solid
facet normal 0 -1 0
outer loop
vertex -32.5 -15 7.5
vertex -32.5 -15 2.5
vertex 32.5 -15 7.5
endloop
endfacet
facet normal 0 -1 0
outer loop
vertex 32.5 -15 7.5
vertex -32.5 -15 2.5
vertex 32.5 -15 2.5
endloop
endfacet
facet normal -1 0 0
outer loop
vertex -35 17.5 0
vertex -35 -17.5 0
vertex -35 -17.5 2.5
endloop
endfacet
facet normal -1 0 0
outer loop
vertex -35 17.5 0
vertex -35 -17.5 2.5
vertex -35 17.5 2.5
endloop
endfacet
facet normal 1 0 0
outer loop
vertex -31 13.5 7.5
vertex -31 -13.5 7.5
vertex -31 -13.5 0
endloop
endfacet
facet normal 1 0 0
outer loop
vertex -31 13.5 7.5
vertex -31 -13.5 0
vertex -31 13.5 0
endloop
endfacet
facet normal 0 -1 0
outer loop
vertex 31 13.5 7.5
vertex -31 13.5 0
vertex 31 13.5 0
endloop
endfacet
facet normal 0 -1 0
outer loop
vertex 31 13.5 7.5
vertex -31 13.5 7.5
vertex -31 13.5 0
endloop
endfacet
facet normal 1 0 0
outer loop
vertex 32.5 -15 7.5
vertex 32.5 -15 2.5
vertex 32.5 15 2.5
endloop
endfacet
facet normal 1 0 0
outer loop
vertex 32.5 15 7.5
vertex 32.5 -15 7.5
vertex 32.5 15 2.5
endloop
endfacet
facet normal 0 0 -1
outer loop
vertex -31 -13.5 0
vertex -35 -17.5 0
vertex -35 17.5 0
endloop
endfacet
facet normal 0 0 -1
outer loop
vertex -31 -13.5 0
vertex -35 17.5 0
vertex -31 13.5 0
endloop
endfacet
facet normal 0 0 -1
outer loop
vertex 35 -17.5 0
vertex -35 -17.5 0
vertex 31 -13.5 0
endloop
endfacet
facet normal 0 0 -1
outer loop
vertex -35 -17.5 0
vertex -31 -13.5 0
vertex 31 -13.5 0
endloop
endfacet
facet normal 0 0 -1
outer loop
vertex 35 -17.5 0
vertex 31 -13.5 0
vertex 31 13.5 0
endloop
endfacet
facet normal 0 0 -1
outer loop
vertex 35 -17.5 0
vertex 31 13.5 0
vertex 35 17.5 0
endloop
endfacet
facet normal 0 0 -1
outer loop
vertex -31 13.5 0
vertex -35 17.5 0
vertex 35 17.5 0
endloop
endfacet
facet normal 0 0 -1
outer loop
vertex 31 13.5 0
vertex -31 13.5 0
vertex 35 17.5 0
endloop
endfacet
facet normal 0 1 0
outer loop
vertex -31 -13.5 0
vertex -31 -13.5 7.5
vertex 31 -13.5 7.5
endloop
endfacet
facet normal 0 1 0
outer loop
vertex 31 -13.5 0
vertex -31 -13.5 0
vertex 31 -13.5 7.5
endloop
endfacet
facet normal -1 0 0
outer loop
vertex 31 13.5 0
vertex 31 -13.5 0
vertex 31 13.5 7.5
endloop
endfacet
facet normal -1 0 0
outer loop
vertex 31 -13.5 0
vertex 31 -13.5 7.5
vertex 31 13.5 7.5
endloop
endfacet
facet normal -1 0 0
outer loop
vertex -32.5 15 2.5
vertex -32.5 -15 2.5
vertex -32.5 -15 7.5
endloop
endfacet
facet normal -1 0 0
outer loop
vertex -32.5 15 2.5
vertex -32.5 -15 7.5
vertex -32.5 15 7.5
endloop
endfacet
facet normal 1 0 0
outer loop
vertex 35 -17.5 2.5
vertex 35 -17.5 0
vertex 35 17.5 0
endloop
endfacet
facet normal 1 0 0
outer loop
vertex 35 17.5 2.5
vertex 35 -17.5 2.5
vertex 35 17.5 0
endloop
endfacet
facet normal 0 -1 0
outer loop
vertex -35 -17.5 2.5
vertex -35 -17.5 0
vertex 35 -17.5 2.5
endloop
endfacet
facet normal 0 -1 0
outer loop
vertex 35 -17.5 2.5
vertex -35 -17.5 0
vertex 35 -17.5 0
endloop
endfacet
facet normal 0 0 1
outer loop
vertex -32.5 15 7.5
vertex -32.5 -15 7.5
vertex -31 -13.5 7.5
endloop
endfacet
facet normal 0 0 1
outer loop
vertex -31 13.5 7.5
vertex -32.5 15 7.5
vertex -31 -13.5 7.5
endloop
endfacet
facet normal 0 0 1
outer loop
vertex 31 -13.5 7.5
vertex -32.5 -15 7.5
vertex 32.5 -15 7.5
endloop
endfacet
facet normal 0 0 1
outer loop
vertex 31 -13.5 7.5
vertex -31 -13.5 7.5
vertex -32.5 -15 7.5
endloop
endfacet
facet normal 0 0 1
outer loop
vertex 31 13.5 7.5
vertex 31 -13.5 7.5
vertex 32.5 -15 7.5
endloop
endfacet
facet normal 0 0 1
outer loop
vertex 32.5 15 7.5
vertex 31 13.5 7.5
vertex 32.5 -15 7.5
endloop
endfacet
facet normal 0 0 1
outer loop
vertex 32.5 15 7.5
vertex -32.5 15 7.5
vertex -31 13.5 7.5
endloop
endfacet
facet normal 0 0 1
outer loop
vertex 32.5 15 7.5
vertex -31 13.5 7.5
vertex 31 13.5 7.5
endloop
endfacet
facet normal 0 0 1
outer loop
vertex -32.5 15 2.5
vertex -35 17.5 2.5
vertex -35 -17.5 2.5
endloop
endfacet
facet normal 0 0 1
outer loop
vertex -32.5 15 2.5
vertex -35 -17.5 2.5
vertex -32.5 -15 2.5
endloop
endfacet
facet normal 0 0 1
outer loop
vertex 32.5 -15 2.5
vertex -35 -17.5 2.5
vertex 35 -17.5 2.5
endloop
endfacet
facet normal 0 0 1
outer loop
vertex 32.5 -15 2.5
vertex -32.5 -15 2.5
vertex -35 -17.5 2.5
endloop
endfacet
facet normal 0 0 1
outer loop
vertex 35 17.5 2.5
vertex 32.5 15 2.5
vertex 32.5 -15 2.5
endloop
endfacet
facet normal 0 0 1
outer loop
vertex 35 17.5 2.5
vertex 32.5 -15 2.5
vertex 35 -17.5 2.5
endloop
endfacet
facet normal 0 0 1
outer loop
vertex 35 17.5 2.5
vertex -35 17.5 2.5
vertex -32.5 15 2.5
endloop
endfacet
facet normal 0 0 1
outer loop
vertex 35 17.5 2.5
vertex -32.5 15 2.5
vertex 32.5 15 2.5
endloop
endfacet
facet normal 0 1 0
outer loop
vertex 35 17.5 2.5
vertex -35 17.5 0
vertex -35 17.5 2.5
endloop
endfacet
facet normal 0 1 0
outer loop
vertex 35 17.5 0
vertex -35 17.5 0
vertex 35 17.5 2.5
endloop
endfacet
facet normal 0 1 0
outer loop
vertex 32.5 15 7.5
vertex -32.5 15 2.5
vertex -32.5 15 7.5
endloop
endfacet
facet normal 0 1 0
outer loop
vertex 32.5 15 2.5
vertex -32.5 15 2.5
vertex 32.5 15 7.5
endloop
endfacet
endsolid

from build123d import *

# Parameters (mm, degrees)
F0_W     = 70
F0_H     = 35
F1_DEPTH = 2.5
F2_W     = 65
F2_H     = 30
F2_W_2   = 62
F2_H_2   = 27
F3_DEPTH = 5
F4_DEPTH = 2.5


# Not quite as in the source:
# - the program builds the solid bodies; features that only make, move or delete a surface that nothing else refers to are left out


with BuildPart() as f1:
    # F0 (on Top) → F1 (new body)
    with BuildSketch(Plane.XY):
        Rectangle(F0_W, F0_H)
    extrude(amount=F1_DEPTH)

    # F2 (on face) → F3 (join)
    with BuildSketch(Plane.XY.offset(2.5)):
        Rectangle(F2_W, F2_H)
        Rectangle(F2_W_2, F2_H_2, mode=Mode.SUBTRACT)
    extrude(amount=F3_DEPTH)

    # F4 (cut, through all): a face of the model
    f4_faces = [f1.faces().sort_by_distance(p)[0] for p in [
        (0, 0, 2.5),
    ]]
    extrude(f4_faces, amount=-F4_DEPTH, mode=Mode.SUBTRACT)


solid = f1.part
